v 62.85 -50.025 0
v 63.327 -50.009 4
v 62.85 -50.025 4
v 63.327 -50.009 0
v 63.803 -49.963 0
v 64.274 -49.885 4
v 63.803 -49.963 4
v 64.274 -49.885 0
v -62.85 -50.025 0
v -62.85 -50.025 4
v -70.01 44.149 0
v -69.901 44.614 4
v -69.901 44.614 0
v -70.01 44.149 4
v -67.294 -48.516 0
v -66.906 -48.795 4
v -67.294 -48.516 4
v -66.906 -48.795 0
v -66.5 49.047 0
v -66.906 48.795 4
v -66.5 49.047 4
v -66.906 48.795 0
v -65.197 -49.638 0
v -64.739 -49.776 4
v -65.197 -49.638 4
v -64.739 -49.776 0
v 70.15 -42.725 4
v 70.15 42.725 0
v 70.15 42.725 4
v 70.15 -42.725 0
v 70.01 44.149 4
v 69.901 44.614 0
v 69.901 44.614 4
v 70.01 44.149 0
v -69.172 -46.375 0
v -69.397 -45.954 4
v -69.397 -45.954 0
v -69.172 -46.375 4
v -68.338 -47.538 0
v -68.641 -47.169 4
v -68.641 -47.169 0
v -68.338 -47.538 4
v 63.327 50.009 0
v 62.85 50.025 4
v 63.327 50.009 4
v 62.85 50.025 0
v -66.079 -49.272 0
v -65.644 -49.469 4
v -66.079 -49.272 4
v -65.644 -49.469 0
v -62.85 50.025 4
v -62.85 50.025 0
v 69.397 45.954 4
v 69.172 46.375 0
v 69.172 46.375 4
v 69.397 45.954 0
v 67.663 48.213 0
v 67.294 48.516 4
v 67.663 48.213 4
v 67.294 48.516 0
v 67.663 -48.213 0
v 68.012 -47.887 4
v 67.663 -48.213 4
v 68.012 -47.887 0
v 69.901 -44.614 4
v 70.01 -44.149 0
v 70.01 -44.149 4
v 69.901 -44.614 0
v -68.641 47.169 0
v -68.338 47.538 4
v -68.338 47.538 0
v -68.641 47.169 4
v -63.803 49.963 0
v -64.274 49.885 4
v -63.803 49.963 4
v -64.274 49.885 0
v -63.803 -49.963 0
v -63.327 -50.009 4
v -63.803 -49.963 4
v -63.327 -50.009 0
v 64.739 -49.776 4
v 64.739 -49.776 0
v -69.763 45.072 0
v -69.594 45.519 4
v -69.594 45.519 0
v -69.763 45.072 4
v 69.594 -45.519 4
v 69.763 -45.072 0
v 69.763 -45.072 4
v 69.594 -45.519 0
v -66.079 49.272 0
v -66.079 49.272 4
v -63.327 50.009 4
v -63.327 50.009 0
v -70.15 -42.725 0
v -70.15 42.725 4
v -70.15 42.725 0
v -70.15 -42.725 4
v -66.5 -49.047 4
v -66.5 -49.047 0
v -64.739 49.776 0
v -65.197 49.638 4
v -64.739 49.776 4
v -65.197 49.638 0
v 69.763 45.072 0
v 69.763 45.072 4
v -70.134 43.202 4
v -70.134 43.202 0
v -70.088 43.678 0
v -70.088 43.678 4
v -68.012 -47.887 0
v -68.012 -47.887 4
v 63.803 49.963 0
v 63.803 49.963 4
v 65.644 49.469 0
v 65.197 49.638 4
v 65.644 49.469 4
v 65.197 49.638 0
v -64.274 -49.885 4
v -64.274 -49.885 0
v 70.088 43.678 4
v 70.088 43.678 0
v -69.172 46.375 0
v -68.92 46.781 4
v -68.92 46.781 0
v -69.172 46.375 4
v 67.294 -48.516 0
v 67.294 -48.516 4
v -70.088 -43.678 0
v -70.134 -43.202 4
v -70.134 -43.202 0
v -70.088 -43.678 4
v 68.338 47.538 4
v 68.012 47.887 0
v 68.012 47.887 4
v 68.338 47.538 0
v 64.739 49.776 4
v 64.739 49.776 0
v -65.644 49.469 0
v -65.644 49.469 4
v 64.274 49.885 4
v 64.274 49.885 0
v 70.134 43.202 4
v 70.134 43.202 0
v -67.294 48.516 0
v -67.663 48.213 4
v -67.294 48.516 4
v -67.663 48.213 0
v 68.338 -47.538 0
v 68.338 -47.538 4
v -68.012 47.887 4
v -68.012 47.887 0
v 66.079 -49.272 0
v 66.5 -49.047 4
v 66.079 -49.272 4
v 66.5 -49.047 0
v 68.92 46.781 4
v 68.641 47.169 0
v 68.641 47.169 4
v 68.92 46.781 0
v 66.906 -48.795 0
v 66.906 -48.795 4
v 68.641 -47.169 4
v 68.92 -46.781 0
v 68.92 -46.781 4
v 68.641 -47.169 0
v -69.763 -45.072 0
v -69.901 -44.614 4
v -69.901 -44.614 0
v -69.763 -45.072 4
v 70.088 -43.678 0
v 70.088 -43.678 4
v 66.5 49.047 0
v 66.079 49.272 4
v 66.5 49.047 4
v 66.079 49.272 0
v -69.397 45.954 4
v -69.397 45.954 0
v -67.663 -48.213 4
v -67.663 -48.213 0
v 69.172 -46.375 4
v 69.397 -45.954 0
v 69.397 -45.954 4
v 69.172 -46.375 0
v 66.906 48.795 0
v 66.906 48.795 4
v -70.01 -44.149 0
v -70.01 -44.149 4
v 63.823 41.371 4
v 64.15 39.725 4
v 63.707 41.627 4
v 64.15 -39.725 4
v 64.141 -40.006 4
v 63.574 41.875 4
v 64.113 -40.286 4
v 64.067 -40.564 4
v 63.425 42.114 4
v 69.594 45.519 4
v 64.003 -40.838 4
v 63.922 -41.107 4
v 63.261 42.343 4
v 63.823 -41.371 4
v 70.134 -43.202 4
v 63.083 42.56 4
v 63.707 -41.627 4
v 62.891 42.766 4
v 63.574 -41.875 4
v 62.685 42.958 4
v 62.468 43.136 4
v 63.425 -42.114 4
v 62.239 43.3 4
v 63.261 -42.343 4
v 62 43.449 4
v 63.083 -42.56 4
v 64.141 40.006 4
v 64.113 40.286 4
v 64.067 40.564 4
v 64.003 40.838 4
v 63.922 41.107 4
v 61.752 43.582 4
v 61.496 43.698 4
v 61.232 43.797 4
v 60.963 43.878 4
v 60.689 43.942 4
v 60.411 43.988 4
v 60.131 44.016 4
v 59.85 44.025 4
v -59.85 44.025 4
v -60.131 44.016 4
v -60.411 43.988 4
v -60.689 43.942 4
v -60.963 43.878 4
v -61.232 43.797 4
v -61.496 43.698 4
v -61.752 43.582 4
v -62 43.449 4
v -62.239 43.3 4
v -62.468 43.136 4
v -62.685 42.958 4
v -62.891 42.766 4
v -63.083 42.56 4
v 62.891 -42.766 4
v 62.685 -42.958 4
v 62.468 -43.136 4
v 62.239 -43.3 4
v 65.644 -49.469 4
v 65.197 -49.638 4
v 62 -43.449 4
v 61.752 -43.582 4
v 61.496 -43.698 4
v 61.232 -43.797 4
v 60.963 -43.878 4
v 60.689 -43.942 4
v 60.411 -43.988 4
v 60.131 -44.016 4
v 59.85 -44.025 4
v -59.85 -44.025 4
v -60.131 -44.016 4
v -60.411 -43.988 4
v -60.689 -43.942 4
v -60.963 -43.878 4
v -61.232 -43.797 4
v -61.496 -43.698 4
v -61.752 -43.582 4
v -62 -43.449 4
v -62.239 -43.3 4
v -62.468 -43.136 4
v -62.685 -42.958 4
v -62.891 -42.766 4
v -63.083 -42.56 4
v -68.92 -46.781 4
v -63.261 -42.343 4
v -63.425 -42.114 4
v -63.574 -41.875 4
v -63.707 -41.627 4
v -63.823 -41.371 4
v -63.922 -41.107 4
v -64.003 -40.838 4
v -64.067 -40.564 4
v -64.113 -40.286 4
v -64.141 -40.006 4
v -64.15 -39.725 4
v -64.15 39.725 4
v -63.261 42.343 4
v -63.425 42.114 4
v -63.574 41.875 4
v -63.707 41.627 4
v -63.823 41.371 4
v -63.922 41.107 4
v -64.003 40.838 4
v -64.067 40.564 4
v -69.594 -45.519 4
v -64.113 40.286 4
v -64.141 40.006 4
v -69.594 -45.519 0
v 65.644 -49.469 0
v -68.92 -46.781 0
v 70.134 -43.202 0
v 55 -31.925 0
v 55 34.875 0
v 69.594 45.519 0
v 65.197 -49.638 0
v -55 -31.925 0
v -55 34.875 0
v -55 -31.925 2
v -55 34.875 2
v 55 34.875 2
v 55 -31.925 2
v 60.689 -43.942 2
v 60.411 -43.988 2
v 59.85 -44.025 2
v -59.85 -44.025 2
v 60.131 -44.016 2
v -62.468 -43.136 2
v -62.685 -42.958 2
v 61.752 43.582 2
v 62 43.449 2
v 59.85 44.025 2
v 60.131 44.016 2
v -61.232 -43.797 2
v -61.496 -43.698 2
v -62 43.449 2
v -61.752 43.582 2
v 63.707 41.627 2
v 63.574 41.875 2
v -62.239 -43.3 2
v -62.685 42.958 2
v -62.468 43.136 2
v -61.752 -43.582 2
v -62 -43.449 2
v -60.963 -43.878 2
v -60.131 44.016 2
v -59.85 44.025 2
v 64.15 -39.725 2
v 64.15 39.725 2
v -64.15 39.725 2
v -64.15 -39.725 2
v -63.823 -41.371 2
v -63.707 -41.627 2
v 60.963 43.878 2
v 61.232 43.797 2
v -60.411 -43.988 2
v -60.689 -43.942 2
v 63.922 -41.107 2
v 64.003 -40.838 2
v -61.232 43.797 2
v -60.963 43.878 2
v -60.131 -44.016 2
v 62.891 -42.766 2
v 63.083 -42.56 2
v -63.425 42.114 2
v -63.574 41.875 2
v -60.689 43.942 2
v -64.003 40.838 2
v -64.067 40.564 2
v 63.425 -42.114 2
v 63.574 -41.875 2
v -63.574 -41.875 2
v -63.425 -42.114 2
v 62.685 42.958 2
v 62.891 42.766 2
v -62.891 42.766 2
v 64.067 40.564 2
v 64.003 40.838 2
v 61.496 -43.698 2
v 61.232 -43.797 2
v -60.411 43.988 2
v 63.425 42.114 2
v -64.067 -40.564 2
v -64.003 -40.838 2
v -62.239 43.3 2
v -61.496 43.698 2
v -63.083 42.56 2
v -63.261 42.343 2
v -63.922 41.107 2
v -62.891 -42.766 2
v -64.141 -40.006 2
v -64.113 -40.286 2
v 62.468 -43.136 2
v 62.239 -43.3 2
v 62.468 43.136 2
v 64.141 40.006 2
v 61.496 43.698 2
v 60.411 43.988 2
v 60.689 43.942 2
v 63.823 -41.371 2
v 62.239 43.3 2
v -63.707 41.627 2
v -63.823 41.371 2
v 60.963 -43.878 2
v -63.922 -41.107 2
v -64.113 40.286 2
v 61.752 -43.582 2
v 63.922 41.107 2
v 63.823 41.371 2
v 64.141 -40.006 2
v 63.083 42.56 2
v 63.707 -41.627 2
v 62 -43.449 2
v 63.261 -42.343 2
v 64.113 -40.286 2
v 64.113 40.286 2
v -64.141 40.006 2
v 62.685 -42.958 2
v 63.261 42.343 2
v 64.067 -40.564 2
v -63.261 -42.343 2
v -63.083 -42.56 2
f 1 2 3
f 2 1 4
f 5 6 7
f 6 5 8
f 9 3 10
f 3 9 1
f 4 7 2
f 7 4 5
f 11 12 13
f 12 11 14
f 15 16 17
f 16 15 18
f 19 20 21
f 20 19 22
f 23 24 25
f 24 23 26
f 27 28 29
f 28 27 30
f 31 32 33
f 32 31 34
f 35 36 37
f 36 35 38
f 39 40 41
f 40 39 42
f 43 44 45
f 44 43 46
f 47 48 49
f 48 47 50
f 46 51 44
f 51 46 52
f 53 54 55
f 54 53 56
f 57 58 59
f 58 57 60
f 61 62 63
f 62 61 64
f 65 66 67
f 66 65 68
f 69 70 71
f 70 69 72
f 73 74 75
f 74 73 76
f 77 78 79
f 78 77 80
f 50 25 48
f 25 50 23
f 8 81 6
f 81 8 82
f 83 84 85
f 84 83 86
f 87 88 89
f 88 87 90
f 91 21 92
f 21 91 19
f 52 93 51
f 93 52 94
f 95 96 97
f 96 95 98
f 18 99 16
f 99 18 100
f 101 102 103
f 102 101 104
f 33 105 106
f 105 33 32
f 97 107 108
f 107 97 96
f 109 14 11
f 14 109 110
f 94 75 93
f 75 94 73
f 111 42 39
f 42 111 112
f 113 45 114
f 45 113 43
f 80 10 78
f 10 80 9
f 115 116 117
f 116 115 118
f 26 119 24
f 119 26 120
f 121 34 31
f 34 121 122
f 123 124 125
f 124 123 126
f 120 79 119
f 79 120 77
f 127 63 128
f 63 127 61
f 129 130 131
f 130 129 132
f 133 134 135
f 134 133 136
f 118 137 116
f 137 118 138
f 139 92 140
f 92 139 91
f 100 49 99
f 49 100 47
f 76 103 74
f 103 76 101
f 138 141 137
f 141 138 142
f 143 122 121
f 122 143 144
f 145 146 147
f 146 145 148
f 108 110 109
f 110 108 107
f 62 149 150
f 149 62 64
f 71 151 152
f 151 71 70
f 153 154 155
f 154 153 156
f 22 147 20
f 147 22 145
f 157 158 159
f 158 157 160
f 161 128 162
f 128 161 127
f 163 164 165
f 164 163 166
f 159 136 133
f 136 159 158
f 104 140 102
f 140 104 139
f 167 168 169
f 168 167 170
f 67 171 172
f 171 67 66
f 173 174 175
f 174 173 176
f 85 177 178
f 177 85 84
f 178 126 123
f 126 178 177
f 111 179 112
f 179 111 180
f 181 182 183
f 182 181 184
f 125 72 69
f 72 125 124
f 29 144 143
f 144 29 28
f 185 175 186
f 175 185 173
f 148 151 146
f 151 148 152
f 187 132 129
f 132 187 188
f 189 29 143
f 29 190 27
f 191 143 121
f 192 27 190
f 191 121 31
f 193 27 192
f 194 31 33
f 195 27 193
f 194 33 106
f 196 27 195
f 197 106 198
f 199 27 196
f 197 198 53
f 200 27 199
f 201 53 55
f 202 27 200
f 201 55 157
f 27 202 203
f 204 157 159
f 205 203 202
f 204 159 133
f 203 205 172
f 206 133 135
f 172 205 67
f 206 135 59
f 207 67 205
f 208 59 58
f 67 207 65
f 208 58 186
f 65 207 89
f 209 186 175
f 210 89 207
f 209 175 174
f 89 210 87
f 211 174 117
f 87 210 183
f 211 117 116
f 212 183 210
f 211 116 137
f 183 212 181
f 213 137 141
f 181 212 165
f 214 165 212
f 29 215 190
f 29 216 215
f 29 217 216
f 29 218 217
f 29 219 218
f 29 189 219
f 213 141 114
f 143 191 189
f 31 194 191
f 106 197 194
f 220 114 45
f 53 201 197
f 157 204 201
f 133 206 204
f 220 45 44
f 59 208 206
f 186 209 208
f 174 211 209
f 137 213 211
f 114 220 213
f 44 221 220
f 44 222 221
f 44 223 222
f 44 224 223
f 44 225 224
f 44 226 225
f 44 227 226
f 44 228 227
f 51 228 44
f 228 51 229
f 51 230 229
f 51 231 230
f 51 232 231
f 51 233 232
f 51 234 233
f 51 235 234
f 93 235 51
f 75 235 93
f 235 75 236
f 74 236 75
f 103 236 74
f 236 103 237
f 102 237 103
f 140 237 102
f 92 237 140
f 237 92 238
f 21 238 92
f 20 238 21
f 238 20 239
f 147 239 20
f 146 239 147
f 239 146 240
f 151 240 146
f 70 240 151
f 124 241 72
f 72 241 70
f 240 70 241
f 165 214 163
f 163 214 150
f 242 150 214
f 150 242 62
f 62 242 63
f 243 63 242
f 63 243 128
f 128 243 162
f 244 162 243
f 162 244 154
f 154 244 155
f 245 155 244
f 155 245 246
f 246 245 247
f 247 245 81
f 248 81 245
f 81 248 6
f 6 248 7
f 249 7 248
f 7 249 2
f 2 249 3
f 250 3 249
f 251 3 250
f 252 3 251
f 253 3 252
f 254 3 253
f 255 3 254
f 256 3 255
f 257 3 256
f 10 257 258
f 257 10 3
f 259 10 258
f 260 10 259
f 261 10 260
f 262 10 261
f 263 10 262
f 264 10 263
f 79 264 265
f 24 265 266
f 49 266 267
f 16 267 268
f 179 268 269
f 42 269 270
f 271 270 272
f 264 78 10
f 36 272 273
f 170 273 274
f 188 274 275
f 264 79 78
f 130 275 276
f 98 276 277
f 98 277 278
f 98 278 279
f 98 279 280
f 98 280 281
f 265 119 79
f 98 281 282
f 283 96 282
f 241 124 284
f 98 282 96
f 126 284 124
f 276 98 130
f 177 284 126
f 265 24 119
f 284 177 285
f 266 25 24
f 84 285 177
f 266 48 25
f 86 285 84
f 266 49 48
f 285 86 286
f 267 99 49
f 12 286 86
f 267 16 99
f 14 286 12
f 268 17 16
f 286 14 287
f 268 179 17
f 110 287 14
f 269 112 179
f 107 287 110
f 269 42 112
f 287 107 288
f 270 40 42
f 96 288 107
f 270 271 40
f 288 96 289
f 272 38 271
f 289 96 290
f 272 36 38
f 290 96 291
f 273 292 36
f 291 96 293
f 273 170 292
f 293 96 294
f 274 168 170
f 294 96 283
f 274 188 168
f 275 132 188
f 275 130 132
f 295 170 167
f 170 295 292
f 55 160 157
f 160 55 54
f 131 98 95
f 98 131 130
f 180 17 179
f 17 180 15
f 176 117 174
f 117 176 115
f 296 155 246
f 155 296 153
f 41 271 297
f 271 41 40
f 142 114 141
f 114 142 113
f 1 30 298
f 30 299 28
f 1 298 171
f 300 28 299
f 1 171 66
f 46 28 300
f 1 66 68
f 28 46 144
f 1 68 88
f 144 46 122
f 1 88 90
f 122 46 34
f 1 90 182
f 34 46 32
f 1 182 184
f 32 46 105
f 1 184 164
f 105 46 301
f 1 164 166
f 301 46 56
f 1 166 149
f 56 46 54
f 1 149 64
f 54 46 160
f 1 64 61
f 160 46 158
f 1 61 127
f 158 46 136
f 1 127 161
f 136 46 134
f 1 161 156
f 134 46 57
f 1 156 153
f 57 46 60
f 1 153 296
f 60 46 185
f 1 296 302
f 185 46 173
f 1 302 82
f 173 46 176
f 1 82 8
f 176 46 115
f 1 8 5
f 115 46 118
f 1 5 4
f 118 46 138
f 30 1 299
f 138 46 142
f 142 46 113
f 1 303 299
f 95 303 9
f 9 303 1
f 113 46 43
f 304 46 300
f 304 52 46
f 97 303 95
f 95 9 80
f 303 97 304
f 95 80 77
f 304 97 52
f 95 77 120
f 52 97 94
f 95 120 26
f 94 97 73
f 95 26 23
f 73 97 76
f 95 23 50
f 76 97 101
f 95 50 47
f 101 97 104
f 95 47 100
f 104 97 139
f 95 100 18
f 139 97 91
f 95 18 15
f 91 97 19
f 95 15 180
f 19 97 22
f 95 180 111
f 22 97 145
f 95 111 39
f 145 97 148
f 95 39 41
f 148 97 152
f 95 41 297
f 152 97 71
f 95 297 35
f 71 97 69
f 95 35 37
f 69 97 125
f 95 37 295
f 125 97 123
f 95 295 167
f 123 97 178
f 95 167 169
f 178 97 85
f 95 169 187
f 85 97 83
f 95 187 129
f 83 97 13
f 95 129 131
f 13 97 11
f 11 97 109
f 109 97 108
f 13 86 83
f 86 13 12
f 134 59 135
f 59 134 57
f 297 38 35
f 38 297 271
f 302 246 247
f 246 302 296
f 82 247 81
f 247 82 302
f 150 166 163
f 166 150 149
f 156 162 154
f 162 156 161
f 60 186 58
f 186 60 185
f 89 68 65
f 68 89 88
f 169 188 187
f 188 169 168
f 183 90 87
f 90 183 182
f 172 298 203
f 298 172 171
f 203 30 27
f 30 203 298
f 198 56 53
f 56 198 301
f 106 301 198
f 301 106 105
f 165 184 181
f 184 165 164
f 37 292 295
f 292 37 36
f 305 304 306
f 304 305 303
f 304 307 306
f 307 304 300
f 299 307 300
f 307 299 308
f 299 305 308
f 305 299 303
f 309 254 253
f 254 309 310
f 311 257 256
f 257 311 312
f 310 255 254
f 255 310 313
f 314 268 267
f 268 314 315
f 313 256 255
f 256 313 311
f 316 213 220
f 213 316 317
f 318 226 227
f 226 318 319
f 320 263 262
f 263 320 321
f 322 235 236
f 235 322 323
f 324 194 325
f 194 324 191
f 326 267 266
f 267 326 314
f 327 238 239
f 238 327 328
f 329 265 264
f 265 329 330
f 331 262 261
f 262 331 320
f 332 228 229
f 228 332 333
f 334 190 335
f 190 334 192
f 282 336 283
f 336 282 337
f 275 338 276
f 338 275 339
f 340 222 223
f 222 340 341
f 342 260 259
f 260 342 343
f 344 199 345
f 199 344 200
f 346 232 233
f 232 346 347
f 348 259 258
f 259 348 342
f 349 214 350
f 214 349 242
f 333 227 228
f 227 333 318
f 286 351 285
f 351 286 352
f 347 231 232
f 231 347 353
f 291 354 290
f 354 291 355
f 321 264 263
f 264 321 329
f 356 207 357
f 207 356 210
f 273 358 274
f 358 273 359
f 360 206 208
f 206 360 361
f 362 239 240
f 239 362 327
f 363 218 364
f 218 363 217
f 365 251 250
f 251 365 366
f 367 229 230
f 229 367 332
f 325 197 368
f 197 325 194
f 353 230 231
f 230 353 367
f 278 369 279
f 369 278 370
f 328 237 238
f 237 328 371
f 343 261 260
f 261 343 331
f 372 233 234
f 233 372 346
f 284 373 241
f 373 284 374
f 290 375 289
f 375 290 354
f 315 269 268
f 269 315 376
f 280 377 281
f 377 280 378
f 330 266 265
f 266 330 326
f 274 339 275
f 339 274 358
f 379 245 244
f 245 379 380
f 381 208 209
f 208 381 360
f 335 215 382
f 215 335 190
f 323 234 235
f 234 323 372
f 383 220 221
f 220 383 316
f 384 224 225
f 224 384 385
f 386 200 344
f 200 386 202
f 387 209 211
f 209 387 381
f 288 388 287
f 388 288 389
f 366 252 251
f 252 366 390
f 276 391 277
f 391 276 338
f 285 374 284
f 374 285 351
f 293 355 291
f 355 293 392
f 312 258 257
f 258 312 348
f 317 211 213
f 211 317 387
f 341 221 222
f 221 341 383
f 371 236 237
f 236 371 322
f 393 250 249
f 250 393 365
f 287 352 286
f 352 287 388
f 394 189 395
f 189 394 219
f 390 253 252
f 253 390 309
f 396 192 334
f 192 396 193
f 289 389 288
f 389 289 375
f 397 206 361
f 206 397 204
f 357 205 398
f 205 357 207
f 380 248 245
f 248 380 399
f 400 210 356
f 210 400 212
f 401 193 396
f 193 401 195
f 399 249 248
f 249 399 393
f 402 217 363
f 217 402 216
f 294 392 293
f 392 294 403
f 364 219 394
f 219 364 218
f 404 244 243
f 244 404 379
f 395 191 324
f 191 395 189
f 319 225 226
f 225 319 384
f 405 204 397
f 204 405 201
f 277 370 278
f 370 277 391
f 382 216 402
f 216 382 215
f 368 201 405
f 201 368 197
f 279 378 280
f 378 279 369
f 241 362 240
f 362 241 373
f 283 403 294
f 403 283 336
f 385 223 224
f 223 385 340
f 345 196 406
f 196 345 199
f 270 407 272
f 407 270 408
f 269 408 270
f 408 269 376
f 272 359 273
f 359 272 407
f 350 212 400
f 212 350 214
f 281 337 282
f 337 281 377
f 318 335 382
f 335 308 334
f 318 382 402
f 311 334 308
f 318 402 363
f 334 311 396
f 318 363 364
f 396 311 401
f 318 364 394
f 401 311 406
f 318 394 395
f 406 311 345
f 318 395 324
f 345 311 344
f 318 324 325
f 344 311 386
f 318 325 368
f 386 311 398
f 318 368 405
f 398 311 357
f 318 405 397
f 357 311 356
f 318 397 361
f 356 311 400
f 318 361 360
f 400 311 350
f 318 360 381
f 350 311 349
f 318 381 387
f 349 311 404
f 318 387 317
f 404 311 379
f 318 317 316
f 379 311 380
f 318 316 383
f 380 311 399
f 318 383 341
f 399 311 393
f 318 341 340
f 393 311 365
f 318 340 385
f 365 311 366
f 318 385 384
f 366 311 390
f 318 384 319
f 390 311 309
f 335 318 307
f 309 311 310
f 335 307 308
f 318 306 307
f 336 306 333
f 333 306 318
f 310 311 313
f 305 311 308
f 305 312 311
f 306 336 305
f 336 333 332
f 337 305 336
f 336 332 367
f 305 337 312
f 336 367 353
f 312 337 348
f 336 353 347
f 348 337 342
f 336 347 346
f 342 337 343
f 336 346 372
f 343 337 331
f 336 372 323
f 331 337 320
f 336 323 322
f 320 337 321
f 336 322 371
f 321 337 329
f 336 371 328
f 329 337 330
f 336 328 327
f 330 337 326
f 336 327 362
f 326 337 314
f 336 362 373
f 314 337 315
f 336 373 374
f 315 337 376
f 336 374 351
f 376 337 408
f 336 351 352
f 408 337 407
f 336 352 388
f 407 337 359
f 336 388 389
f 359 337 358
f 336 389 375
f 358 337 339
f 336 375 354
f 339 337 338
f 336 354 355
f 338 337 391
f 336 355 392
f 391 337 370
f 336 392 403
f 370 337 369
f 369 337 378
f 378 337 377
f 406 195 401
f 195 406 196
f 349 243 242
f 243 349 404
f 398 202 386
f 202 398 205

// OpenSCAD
// VMax / Waveshare ESP32-S3-Touch-LCD-5 capacitive, 800x480.
// Units: mm. Print z=0 face down, glass enters from z=4 side.
// Official drawing: ../drawings/waveshare-touch-dimensions.webp
glass_w = 127.70;
glass_h = 87.45;
glass_r = 4;
clearance = 0.30; // per side; design choice, not vendor tolerance
wall = 6;
lip = 2;
pocket_depth = 2; // shallow locating rim, NOT full glass thickness
window_w = 110.00; // 0.50 beyond active area each side
window_h = 66.80;
window_y = 1.475; // active area is 9.35 from top, 12.30 from bottom
window_r = 0; // square opening preserves rectangular active area
$fn = 96;
module rounded_rect(w,h,r) {
    if (r == 0) square([w,h], center=true);
    else offset(r=r) square([w-2*r,h-2*r], center=true);
}
difference() {
    linear_extrude(lip+pocket_depth)
        rounded_rect(glass_w+2*clearance+2*wall,
                     glass_h+2*clearance+2*wall, glass_r+clearance+3);
    translate([0,window_y,-0.01]) linear_extrude(lip+pocket_depth+0.02)
        rounded_rect(window_w,window_h,window_r);
    translate([0,0,lip]) linear_extrude(pocket_depth+0.01)
        rounded_rect(glass_w+2*clearance,glass_h+2*clearance,glass_r+clearance);
}
